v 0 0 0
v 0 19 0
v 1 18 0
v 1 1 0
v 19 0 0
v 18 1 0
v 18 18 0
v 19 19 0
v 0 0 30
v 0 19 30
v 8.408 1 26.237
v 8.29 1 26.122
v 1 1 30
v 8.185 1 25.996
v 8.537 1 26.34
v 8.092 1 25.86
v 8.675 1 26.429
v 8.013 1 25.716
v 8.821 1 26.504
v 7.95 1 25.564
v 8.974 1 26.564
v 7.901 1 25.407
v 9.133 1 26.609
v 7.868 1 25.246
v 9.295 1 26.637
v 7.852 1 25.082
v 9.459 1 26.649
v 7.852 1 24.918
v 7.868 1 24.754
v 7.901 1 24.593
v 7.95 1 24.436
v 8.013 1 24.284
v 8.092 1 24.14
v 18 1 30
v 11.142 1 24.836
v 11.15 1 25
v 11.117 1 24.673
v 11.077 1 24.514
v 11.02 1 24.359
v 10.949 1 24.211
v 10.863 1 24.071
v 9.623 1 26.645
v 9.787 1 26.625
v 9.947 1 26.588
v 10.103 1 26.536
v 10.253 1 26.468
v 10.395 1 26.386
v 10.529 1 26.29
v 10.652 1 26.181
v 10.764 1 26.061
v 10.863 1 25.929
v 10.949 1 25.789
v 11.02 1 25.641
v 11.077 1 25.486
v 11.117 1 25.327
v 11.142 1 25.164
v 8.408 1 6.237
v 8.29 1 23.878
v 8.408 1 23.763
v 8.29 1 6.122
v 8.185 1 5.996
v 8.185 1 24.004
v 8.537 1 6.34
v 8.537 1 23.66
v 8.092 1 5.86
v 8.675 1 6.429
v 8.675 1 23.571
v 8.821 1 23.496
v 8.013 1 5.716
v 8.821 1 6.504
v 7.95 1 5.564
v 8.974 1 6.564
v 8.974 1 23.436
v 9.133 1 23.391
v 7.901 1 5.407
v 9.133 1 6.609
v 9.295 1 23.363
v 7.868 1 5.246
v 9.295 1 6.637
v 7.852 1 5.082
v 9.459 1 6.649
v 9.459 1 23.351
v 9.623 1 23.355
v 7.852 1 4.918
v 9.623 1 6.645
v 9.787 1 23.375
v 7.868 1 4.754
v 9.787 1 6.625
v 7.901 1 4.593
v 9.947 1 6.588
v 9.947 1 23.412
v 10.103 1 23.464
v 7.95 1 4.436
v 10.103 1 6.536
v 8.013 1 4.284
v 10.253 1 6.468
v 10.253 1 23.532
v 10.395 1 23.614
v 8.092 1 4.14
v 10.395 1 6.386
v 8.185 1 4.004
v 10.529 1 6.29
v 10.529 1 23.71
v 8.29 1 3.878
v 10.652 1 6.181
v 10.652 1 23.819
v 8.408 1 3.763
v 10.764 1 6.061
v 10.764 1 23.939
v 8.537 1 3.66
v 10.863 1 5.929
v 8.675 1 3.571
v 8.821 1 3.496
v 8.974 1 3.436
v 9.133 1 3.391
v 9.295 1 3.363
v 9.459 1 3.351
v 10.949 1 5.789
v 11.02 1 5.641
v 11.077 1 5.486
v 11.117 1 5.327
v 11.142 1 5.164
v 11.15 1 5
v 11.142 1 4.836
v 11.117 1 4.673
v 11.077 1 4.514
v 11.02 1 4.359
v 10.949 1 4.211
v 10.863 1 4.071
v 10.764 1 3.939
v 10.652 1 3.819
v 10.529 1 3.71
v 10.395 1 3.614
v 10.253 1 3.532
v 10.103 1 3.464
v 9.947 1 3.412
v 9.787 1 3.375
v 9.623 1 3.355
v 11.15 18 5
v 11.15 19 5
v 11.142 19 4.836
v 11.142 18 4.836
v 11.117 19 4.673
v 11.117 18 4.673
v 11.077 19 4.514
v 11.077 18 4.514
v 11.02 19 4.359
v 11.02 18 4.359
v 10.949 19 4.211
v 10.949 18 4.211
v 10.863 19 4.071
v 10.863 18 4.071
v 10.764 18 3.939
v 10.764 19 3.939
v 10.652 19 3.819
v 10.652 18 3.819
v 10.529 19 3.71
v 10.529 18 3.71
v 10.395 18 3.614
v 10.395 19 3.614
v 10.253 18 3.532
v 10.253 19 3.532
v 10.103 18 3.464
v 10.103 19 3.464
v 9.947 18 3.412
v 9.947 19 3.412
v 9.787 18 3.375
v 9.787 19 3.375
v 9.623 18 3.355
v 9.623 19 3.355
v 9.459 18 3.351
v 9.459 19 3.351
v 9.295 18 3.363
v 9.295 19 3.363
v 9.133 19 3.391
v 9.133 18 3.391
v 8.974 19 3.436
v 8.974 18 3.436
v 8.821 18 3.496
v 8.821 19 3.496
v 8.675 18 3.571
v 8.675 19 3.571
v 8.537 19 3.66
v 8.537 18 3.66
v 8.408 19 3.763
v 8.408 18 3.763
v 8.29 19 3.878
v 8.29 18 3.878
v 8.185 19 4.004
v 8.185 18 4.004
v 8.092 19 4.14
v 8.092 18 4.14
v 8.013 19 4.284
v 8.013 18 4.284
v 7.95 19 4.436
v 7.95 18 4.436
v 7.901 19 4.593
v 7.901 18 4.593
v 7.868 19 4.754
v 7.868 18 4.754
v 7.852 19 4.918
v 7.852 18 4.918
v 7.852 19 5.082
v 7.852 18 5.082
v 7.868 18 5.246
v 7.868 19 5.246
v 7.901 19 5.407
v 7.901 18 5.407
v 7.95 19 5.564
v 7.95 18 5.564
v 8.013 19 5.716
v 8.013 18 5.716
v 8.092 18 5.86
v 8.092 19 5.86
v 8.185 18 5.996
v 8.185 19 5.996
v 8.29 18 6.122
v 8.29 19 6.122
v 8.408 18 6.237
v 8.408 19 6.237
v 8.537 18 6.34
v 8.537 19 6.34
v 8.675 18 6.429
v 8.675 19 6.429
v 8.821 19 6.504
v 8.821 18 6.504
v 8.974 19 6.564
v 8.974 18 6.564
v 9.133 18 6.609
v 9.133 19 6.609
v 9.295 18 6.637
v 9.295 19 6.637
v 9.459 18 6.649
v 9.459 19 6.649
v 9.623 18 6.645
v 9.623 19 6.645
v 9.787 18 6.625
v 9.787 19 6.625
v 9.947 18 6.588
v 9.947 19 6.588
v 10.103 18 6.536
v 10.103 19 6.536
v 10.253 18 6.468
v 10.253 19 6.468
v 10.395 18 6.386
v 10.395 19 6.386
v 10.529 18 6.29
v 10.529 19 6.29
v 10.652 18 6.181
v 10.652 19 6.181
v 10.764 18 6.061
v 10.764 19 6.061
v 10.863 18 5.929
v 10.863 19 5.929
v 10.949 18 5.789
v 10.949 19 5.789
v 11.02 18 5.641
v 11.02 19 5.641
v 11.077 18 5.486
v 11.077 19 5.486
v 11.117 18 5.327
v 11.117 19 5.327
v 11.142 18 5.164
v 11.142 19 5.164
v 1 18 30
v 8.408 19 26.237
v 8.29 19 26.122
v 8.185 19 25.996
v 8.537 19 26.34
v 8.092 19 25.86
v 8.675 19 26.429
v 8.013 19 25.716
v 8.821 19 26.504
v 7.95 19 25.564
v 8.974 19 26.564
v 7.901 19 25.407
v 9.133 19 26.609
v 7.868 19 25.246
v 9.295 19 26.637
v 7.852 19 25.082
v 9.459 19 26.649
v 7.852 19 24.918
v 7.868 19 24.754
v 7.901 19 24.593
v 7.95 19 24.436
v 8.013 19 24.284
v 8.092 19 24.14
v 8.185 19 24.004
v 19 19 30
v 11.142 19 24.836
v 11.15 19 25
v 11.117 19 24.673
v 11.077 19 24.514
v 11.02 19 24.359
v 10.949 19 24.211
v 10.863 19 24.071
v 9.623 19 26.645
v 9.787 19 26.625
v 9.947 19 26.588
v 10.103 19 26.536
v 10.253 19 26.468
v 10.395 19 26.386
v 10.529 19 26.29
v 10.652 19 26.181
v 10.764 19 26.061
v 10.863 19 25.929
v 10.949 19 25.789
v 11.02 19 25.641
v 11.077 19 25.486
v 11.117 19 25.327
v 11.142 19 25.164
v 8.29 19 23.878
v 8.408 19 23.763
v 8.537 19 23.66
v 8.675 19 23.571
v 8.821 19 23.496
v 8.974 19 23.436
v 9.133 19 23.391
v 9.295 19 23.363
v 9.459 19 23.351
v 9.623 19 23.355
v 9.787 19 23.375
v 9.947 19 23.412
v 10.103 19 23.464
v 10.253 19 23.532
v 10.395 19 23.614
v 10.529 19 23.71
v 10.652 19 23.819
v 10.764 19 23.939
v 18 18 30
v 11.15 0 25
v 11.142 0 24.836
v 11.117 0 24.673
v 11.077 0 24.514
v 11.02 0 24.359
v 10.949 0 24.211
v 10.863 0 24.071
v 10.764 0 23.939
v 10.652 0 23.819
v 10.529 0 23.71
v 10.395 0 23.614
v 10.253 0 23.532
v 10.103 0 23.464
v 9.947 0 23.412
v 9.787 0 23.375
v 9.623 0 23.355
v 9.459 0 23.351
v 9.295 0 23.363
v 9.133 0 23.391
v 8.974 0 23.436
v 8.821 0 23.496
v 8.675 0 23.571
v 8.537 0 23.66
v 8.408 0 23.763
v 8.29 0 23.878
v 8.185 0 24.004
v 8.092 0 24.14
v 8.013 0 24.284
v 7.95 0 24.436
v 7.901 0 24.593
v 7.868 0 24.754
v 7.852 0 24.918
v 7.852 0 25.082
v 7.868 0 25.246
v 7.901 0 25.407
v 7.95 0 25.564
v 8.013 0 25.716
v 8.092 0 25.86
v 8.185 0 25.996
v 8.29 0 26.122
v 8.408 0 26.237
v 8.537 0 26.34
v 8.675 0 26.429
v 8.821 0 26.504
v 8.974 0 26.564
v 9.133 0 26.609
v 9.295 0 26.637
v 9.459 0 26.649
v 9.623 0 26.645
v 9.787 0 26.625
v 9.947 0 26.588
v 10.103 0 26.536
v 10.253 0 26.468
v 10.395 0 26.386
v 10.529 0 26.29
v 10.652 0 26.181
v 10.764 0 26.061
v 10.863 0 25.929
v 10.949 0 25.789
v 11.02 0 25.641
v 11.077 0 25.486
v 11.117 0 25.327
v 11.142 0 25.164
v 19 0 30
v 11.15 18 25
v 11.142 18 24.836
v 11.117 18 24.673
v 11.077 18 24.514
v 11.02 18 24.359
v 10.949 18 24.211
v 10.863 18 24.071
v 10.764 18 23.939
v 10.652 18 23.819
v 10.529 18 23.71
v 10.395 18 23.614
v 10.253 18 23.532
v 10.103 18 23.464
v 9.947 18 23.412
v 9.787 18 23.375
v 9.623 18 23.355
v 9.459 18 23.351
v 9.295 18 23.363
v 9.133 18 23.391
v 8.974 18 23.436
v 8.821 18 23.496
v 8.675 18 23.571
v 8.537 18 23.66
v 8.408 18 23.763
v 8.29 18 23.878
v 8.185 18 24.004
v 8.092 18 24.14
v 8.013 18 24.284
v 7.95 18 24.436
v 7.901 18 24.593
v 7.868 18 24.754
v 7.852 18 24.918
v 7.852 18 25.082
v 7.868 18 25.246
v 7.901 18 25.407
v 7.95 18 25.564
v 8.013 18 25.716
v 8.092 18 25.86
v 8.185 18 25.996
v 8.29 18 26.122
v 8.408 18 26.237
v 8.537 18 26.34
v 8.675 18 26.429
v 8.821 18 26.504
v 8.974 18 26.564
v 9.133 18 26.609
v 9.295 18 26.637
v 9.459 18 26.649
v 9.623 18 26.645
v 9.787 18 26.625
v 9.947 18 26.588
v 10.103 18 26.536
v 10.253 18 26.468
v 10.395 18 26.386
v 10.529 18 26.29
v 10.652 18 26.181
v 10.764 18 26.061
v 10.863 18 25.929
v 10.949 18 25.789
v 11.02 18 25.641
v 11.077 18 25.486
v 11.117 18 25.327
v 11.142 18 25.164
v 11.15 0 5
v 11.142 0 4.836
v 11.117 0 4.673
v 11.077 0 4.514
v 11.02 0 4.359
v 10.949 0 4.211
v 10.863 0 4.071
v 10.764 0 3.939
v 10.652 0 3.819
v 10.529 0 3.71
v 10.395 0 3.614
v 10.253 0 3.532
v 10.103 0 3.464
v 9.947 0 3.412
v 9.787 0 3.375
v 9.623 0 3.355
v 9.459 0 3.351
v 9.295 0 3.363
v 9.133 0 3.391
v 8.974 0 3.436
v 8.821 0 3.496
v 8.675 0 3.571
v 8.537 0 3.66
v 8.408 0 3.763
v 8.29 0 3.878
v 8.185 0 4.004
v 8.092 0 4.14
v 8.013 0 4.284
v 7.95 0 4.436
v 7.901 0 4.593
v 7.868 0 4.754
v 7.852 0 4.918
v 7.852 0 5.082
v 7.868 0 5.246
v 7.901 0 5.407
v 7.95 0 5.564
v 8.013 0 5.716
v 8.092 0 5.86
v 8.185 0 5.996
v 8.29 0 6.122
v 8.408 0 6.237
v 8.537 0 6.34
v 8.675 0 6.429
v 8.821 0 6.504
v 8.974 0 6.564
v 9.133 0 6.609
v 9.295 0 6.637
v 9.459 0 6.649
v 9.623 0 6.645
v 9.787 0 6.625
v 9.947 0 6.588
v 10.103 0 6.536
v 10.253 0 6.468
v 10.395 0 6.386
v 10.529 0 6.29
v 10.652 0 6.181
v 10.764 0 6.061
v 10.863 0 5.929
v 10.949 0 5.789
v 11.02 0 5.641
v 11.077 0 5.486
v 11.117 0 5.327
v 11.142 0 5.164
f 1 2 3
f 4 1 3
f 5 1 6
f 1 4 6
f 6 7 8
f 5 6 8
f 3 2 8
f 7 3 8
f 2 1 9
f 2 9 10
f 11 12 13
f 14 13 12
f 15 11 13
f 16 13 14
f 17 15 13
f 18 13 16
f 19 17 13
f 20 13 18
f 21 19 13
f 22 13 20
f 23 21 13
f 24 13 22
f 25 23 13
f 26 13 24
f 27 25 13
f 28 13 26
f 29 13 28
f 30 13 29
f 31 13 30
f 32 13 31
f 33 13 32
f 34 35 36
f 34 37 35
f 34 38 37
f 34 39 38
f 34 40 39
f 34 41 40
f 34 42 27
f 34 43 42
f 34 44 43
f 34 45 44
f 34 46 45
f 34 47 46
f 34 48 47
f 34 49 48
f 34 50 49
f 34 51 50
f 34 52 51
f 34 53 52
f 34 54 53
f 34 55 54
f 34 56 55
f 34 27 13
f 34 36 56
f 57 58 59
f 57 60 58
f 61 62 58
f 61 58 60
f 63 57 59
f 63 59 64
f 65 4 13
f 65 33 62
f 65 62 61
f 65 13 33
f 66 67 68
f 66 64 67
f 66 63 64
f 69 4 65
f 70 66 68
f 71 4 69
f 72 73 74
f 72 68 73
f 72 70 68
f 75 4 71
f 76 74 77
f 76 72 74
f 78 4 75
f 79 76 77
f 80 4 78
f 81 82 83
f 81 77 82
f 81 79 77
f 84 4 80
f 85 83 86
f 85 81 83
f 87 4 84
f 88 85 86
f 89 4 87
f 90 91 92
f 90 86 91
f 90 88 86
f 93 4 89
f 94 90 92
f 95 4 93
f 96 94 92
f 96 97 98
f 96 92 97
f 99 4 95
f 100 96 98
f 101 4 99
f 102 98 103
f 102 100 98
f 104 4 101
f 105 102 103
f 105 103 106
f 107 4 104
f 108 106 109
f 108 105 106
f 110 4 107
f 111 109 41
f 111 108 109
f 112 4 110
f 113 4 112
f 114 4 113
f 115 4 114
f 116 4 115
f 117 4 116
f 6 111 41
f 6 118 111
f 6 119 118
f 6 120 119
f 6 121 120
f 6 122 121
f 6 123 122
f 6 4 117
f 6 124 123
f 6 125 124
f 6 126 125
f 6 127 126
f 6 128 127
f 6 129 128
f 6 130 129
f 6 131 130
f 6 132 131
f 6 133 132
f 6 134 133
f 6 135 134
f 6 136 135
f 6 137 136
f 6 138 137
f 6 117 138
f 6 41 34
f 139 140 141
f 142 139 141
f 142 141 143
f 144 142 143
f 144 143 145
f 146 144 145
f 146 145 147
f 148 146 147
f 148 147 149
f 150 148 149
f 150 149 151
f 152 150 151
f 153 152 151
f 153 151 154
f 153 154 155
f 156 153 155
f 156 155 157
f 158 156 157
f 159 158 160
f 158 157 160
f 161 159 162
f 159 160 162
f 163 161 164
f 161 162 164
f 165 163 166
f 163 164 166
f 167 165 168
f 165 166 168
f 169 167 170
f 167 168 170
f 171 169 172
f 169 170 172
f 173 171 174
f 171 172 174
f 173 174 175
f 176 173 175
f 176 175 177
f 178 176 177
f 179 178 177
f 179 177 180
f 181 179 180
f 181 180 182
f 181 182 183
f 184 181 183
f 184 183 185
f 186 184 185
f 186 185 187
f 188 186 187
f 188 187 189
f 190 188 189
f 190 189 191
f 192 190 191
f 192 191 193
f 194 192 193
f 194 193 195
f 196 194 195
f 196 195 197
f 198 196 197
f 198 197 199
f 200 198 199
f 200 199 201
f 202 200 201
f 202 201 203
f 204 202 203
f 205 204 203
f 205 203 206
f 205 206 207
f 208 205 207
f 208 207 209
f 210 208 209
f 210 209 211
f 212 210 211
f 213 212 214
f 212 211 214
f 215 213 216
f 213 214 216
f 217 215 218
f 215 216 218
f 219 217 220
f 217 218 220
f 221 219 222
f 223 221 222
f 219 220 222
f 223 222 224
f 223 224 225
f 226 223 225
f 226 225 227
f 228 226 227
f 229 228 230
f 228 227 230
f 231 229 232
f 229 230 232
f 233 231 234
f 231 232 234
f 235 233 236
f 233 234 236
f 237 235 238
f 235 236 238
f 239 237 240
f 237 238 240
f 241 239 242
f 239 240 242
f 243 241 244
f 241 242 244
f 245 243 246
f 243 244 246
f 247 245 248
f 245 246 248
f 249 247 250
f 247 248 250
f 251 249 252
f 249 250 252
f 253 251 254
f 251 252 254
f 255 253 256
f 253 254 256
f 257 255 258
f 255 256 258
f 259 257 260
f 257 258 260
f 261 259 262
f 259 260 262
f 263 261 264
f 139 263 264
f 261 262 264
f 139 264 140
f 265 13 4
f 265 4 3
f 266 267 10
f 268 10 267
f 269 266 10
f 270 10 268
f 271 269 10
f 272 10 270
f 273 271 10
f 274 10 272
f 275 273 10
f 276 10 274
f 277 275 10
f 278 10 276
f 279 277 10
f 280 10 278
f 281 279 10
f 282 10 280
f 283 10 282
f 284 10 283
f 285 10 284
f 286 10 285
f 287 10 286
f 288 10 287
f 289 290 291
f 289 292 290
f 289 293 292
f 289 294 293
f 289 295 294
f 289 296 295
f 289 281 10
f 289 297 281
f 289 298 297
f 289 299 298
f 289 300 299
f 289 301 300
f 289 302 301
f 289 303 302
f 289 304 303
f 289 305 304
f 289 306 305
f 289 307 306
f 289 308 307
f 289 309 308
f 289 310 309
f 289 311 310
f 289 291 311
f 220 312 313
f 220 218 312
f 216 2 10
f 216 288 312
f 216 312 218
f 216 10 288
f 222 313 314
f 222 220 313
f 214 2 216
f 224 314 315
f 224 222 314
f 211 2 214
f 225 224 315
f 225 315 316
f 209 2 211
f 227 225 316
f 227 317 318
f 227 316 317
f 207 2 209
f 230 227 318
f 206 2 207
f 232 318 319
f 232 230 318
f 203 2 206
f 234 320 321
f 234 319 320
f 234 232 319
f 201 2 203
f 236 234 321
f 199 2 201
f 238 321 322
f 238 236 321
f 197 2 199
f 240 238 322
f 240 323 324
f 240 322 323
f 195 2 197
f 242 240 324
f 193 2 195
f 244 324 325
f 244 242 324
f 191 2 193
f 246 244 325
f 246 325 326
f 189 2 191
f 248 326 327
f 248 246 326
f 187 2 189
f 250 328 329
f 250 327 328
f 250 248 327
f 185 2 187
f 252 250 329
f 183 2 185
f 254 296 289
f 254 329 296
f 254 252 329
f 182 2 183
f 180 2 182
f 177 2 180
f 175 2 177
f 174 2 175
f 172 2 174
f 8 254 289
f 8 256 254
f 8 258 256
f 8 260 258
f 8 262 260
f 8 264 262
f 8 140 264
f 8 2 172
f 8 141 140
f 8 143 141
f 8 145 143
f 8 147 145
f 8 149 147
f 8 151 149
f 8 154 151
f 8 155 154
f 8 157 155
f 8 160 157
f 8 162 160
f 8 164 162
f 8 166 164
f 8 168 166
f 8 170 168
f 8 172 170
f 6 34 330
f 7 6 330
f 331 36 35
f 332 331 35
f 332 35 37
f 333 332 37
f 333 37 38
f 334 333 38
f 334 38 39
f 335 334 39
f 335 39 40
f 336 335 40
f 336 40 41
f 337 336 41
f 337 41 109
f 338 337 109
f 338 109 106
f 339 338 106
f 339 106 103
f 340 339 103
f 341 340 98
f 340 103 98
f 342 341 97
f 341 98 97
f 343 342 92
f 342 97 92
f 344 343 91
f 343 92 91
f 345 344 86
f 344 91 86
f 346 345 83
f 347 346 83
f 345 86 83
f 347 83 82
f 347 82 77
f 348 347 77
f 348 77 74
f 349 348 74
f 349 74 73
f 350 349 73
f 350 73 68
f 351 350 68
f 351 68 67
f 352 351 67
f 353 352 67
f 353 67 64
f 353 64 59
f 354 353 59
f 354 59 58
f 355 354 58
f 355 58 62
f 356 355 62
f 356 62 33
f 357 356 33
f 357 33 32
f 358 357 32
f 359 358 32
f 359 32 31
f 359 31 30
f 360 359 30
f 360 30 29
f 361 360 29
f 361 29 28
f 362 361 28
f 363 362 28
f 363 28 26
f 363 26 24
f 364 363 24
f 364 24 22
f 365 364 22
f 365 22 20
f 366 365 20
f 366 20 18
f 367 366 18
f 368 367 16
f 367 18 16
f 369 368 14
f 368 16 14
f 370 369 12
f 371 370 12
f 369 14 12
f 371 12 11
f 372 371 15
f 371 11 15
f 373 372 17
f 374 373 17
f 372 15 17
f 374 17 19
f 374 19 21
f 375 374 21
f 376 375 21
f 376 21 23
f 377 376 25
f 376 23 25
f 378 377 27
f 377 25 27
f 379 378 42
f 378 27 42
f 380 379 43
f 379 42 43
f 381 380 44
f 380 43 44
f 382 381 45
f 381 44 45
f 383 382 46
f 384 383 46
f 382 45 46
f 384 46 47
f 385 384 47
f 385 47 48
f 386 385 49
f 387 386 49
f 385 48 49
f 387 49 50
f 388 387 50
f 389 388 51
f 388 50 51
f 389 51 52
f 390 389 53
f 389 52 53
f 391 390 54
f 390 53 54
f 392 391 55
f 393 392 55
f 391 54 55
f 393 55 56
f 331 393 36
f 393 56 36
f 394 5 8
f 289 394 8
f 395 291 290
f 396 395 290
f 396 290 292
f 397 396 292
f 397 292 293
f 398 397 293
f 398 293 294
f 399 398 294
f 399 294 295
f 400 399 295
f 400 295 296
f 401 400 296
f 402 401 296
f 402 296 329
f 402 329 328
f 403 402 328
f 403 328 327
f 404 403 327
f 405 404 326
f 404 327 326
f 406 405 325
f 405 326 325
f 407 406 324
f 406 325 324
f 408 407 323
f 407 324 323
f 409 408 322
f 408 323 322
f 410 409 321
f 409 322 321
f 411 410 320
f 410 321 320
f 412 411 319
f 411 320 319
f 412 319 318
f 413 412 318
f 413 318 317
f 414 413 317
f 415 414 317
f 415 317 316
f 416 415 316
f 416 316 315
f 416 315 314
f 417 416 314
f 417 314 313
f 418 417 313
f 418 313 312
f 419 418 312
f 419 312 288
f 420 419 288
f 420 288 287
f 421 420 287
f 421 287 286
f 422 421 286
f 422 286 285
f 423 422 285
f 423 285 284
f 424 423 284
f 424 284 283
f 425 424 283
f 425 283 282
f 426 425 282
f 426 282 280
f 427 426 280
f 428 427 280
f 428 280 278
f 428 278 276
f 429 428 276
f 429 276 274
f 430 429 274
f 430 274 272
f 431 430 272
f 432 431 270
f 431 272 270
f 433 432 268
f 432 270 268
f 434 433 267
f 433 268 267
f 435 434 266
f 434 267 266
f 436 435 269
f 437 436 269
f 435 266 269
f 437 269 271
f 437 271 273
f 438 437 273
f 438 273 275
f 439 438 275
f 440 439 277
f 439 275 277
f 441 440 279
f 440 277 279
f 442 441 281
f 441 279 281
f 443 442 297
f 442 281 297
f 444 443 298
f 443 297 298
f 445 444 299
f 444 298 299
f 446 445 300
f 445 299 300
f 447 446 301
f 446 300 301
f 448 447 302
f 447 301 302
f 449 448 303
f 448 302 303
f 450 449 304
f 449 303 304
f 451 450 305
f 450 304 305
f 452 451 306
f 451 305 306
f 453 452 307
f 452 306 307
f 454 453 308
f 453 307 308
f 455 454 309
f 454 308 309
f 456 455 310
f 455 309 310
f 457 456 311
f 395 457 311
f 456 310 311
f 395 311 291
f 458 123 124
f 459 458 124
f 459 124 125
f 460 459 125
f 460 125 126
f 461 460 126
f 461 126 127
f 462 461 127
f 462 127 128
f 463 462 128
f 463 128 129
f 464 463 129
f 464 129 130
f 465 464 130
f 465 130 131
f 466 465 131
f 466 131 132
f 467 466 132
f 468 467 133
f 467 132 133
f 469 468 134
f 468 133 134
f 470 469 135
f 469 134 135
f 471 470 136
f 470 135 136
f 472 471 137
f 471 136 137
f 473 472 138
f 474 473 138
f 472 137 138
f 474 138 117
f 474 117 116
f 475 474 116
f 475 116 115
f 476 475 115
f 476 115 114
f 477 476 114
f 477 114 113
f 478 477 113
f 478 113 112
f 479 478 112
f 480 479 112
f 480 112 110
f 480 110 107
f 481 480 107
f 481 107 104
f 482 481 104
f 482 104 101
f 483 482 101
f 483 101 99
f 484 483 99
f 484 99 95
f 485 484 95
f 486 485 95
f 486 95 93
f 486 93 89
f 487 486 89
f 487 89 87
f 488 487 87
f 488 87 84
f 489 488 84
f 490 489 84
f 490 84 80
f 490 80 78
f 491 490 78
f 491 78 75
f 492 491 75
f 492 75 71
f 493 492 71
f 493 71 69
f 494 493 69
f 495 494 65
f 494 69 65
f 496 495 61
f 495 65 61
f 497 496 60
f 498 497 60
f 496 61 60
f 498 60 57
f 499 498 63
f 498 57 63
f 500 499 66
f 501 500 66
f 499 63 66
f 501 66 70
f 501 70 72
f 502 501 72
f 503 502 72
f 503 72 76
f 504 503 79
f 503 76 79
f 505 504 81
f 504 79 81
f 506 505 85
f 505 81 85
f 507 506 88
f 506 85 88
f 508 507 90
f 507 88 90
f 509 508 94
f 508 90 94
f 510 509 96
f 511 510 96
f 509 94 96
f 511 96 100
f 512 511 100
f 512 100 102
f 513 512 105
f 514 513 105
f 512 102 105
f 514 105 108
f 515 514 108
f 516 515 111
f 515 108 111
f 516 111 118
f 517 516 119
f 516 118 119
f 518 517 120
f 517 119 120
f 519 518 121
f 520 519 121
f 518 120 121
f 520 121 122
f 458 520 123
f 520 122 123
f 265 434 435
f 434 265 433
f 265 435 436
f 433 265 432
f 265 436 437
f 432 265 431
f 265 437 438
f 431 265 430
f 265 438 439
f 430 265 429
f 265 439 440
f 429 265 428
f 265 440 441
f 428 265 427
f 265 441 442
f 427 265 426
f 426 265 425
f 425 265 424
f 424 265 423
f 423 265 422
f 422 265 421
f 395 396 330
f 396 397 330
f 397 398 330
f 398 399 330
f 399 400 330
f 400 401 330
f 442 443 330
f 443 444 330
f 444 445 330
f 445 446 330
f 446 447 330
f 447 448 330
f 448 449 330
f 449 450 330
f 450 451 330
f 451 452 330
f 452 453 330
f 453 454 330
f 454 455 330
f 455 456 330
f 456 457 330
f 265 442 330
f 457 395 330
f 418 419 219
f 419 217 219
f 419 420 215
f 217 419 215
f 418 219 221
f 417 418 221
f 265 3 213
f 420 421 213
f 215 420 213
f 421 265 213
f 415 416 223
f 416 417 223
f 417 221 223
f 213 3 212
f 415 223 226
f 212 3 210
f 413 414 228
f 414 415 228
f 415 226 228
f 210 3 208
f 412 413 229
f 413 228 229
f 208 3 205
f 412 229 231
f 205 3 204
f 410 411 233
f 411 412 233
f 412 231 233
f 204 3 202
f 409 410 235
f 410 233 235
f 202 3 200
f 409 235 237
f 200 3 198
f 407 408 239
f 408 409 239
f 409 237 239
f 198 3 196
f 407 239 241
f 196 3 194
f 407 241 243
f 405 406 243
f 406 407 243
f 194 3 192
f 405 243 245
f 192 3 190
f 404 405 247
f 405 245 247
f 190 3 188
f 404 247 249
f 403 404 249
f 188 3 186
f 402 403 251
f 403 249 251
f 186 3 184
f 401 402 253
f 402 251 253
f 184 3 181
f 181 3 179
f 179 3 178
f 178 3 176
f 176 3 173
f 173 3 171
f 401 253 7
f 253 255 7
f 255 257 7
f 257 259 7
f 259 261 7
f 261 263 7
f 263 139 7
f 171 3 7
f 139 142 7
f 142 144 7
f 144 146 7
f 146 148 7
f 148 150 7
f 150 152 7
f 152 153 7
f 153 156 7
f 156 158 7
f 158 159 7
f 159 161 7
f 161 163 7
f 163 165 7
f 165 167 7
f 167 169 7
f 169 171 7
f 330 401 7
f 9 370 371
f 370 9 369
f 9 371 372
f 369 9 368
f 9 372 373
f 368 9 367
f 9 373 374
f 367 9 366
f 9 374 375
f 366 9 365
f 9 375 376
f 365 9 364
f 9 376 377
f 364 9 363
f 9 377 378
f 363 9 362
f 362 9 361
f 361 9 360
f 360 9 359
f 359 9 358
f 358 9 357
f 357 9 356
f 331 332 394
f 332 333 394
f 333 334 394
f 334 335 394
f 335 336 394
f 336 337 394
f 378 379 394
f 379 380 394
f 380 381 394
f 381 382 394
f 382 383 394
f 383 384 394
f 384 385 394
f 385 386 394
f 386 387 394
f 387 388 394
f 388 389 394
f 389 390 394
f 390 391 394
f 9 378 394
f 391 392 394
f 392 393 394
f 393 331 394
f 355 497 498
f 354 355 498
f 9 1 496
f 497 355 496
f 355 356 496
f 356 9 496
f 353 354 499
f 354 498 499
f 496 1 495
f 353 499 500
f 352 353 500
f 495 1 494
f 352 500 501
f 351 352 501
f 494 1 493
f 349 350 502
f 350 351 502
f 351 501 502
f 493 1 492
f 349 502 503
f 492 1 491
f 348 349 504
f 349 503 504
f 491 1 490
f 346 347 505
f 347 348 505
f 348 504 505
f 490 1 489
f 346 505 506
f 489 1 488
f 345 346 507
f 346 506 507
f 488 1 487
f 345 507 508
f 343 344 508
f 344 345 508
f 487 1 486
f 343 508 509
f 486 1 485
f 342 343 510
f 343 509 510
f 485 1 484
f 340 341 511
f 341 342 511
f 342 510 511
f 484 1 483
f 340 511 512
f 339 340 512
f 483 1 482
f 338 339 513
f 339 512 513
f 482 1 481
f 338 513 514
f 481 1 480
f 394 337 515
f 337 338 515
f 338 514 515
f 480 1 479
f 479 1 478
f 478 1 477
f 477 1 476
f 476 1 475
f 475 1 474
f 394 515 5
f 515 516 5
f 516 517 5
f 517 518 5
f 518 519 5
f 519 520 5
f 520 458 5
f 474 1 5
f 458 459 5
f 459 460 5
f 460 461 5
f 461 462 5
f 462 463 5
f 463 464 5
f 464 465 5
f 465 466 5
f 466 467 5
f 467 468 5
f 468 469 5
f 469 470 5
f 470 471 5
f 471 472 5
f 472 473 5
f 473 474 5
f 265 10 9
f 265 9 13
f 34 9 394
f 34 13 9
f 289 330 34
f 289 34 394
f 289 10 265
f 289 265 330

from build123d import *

# Parameters (mm, degrees)
ESBO_O1_W                = 19
ESBO_O1_H                = 19
RESSALTO_EXTRUS_O1_DEPTH = 30
CASCA1_T                 = -1
ESBO_O2_R                = 1.65
CORTE_EXTRUS_O1_DEPTH    = 20


with BuildPart() as part:
    # Esboço1 → Ressalto-extrusão1 (new body)
    with BuildSketch(Plane.XY):
        with Locations((9.5, 9.5)):
            Rectangle(ESBO_O1_W, ESBO_O1_H)
    extrude(amount=RESSALTO_EXTRUS_O1_DEPTH)

    # Casca1
    casca1_openings = [part.faces().sort_by_distance(p)[0] for p in [
        (9.5, 9.5, 30),
        (9.5, 9.5, 0),
    ]]
    offset(amount=CASCA1_T, openings=casca1_openings, kind=Kind.INTERSECTION)

    # Esboço2 → Corte-extrusão1 (cut, through all)
    with BuildSketch(Plane(origin=(0, 19, 0), x_dir=(1, 0, 0), z_dir=(0, 1, 0))):
        with Locations((9.5, -25)):
            Circle(ESBO_O2_R)
        with Locations((9.5, -5)):
            Circle(ESBO_O2_R)
    extrude(amount=-CORTE_EXTRUS_O1_DEPTH, mode=Mode.SUBTRACT)


solid = part.part
